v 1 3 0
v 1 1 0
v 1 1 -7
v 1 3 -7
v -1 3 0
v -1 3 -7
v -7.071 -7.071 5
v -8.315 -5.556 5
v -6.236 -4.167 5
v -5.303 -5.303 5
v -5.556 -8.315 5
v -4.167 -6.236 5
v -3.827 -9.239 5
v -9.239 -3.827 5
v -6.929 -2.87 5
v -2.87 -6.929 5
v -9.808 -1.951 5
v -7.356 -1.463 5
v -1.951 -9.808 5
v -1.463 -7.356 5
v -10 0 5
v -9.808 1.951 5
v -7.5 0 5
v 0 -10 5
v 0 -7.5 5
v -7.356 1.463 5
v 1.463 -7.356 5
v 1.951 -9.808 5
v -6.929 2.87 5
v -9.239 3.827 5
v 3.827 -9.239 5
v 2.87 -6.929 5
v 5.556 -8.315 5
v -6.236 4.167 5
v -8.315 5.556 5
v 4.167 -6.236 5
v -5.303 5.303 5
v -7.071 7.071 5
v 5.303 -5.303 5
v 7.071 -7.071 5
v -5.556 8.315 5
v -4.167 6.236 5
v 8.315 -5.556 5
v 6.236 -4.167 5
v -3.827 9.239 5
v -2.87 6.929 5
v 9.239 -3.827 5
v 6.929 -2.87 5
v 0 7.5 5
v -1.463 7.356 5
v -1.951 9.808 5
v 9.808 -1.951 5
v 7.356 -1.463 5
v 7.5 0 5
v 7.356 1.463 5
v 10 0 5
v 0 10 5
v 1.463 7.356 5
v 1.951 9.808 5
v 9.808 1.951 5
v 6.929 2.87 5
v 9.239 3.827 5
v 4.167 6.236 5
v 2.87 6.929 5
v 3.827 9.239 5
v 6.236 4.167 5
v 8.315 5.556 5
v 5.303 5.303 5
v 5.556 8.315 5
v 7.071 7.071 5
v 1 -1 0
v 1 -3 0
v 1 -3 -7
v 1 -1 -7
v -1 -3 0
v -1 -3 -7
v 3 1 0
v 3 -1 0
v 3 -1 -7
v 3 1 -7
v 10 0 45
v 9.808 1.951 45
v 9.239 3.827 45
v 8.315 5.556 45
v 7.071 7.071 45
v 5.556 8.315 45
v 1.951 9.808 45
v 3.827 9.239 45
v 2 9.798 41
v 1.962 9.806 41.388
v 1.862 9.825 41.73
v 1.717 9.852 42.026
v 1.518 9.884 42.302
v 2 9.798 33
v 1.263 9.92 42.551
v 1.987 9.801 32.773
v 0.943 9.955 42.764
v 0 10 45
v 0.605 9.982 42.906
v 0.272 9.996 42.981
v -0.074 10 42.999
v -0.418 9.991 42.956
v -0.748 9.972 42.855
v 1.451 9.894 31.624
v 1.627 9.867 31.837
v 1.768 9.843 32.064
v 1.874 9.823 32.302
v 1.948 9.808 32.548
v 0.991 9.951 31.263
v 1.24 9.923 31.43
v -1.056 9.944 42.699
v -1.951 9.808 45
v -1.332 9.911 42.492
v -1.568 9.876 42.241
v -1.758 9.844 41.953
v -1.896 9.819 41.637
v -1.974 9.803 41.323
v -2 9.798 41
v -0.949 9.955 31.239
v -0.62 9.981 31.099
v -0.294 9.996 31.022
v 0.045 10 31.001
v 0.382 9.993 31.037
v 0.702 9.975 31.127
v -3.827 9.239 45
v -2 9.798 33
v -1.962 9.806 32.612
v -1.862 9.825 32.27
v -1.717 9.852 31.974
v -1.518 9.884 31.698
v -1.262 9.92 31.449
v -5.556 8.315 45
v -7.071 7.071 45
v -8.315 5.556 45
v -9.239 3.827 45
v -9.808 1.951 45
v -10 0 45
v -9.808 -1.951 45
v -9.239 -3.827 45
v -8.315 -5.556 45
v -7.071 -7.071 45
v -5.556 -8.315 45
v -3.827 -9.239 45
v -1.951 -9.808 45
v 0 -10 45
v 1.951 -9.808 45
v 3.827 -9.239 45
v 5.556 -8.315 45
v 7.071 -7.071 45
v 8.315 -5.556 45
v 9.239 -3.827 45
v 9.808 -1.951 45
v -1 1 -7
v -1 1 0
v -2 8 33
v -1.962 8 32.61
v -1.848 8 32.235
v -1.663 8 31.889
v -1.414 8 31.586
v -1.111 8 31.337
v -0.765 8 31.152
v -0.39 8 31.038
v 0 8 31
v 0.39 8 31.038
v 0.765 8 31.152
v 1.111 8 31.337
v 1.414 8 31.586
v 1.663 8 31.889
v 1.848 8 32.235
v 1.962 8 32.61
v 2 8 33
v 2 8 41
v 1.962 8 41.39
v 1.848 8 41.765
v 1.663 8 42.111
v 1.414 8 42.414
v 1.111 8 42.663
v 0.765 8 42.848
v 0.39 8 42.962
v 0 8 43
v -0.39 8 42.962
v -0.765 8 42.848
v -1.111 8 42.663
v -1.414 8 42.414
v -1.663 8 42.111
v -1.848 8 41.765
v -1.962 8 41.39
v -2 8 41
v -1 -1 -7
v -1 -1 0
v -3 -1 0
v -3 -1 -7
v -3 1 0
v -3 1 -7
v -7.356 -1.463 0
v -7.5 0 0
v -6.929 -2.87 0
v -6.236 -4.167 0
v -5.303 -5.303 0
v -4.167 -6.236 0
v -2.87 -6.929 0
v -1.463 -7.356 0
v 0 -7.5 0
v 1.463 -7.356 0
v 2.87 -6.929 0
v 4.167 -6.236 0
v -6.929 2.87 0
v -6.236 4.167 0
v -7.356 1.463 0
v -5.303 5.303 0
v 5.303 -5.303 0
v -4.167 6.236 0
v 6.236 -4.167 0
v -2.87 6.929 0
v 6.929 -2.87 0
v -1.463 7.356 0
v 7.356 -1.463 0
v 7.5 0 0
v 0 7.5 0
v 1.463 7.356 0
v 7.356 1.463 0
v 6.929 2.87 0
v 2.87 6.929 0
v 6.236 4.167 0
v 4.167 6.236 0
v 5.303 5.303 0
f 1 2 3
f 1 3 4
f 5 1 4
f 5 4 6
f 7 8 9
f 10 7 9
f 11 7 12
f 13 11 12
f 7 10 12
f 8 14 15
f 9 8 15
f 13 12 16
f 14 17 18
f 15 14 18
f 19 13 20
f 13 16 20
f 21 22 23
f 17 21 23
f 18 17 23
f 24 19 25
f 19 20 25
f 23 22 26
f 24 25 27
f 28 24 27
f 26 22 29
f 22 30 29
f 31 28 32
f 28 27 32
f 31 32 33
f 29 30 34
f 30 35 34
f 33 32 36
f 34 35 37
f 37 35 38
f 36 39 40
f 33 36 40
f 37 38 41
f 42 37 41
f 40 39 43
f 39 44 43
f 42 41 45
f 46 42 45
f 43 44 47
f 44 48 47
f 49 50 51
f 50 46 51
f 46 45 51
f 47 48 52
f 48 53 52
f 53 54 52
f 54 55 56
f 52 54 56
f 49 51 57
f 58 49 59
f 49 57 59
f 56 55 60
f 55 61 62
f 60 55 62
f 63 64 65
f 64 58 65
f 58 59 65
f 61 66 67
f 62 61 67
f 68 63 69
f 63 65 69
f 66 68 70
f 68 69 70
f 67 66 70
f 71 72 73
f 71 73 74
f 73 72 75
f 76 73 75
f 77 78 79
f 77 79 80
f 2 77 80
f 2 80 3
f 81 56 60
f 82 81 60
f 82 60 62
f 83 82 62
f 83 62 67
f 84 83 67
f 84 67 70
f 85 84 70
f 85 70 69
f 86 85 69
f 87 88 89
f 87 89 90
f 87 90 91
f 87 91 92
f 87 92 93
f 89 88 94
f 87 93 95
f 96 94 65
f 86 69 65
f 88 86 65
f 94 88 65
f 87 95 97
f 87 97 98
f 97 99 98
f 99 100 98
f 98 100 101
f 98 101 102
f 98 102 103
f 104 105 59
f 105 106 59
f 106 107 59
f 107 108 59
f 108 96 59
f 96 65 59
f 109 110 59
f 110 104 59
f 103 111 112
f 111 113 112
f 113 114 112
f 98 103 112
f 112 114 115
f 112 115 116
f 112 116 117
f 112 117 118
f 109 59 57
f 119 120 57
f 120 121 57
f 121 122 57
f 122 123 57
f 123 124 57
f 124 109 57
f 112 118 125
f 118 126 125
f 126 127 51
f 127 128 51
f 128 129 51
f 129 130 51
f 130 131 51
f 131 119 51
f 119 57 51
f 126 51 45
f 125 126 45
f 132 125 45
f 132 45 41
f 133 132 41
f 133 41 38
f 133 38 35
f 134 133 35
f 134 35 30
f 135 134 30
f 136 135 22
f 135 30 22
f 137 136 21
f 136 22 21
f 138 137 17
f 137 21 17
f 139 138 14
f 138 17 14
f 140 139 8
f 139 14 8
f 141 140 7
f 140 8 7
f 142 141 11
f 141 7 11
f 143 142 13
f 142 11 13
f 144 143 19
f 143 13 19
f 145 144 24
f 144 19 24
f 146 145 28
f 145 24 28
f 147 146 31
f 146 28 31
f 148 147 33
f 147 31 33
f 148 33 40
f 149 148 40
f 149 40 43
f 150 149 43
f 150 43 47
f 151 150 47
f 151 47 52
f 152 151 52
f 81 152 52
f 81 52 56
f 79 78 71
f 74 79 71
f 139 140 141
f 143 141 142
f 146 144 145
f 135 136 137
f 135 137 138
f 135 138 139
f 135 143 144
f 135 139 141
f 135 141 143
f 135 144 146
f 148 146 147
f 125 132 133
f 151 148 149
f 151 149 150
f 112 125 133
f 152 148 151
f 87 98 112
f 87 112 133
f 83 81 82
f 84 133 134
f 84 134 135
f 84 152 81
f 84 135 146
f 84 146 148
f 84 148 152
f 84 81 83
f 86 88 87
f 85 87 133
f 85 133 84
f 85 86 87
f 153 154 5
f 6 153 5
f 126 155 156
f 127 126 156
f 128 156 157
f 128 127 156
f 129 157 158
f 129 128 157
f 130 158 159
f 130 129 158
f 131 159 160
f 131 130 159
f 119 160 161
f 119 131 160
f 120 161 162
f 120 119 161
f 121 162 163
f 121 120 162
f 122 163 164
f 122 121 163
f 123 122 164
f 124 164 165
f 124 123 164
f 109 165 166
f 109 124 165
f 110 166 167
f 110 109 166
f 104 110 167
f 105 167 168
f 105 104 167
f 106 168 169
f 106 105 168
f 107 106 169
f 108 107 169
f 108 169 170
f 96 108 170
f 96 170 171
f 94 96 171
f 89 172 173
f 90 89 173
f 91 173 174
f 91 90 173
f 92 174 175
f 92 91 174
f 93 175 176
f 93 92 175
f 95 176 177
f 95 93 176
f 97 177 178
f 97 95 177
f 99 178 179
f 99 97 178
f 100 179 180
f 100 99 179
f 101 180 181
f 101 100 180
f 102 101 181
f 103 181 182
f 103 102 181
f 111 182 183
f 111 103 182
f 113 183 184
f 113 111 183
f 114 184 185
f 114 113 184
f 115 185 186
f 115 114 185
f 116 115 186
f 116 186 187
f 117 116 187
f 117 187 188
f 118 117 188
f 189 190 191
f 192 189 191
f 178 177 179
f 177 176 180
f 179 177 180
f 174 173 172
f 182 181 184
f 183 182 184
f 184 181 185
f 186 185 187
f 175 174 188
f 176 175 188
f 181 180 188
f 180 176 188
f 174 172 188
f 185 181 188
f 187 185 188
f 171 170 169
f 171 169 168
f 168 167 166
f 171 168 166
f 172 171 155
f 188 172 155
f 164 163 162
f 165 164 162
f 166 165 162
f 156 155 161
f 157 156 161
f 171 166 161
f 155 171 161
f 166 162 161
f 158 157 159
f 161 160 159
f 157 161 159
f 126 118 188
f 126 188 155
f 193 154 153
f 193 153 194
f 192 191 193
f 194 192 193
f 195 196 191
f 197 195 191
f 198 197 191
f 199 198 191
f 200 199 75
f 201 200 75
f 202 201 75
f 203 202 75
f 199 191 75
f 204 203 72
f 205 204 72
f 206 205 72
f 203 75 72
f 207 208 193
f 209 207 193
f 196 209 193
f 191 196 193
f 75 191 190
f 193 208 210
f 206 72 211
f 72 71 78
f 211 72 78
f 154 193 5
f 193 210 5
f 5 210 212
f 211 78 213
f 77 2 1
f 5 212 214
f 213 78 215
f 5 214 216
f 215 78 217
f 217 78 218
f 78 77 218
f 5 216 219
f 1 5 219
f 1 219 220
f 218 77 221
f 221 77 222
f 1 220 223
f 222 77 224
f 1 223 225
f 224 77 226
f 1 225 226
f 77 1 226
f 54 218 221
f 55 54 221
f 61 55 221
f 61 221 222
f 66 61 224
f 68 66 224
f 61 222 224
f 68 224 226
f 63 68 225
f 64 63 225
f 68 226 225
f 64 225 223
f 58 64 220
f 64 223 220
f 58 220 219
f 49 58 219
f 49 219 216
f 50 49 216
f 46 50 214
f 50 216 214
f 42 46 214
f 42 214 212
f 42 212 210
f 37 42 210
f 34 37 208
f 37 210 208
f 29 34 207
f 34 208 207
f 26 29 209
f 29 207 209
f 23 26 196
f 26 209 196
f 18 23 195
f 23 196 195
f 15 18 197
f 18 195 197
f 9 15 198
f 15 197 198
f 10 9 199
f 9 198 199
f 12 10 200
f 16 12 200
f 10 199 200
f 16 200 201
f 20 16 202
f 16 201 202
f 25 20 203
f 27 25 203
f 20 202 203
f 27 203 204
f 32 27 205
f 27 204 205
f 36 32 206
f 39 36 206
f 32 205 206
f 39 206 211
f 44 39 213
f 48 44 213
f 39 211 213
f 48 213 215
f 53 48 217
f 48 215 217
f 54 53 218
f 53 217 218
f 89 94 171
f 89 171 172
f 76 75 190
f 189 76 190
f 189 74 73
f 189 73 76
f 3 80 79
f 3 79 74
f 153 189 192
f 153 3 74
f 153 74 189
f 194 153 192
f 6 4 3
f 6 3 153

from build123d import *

# Parameters (mm, degrees)
SKETCH_1_R          = 7.5
EXTRUDE_1_DEPTH     = 5
SKETCH_2_W          = 2
SKETCH_2_H          = 2
EXTRUDE_2_DEPTH     = 7
SKETCH_3_R          = 10
EXTRUDE_3_DEPTH     = 40
CUT_EXTRUDE_1_DEPTH = 2


with BuildPart() as part:
    # 草图1 → 凸台-拉伸1 (new body)
    with BuildSketch(Plane.XY):
        Circle(SKETCH_1_R)
    extrude(amount=EXTRUDE_1_DEPTH)

    # 草图2 → 凸台-拉伸2 (add)
    with BuildSketch(Plane(origin=(0, 0, 0), x_dir=(-1, 0, 0), z_dir=(0, 0, -1))):
        with Locations((-2, 0)):
            Rectangle(SKETCH_2_W, SKETCH_2_H)
        with Locations((0, 2)):
            Rectangle(SKETCH_2_W, SKETCH_2_H)
        with Locations((2, 0)):
            Rectangle(SKETCH_2_W, SKETCH_2_H)
        Rectangle(SKETCH_2_W, SKETCH_2_H)
        with Locations((0, -2)):
            Rectangle(SKETCH_2_W, SKETCH_2_H)
    extrude(amount=EXTRUDE_2_DEPTH)

    # 草图3 → 凸台-拉伸3 (add)
    with BuildSketch(Plane.XY.offset(5)):
        Circle(SKETCH_3_R)
    extrude(amount=EXTRUDE_3_DEPTH)

    # 草图4 → 切除-拉伸1 (cut)
    with BuildSketch(Plane(origin=(0, 10, 0), x_dir=(1, 0, 0), z_dir=(0, 1, 0))):
        with BuildLine():
            Line((-2, -41), (-2, -33))
            ThreePointArc((-2, -33), (0, -31), (2, -33))
            Line((2, -33), (2, -41))
            ThreePointArc((2, -41), (0, -43), (-2, -41))
        make_face()
    extrude(amount=-CUT_EXTRUDE_1_DEPTH, mode=Mode.SUBTRACT)


solid = part.part
